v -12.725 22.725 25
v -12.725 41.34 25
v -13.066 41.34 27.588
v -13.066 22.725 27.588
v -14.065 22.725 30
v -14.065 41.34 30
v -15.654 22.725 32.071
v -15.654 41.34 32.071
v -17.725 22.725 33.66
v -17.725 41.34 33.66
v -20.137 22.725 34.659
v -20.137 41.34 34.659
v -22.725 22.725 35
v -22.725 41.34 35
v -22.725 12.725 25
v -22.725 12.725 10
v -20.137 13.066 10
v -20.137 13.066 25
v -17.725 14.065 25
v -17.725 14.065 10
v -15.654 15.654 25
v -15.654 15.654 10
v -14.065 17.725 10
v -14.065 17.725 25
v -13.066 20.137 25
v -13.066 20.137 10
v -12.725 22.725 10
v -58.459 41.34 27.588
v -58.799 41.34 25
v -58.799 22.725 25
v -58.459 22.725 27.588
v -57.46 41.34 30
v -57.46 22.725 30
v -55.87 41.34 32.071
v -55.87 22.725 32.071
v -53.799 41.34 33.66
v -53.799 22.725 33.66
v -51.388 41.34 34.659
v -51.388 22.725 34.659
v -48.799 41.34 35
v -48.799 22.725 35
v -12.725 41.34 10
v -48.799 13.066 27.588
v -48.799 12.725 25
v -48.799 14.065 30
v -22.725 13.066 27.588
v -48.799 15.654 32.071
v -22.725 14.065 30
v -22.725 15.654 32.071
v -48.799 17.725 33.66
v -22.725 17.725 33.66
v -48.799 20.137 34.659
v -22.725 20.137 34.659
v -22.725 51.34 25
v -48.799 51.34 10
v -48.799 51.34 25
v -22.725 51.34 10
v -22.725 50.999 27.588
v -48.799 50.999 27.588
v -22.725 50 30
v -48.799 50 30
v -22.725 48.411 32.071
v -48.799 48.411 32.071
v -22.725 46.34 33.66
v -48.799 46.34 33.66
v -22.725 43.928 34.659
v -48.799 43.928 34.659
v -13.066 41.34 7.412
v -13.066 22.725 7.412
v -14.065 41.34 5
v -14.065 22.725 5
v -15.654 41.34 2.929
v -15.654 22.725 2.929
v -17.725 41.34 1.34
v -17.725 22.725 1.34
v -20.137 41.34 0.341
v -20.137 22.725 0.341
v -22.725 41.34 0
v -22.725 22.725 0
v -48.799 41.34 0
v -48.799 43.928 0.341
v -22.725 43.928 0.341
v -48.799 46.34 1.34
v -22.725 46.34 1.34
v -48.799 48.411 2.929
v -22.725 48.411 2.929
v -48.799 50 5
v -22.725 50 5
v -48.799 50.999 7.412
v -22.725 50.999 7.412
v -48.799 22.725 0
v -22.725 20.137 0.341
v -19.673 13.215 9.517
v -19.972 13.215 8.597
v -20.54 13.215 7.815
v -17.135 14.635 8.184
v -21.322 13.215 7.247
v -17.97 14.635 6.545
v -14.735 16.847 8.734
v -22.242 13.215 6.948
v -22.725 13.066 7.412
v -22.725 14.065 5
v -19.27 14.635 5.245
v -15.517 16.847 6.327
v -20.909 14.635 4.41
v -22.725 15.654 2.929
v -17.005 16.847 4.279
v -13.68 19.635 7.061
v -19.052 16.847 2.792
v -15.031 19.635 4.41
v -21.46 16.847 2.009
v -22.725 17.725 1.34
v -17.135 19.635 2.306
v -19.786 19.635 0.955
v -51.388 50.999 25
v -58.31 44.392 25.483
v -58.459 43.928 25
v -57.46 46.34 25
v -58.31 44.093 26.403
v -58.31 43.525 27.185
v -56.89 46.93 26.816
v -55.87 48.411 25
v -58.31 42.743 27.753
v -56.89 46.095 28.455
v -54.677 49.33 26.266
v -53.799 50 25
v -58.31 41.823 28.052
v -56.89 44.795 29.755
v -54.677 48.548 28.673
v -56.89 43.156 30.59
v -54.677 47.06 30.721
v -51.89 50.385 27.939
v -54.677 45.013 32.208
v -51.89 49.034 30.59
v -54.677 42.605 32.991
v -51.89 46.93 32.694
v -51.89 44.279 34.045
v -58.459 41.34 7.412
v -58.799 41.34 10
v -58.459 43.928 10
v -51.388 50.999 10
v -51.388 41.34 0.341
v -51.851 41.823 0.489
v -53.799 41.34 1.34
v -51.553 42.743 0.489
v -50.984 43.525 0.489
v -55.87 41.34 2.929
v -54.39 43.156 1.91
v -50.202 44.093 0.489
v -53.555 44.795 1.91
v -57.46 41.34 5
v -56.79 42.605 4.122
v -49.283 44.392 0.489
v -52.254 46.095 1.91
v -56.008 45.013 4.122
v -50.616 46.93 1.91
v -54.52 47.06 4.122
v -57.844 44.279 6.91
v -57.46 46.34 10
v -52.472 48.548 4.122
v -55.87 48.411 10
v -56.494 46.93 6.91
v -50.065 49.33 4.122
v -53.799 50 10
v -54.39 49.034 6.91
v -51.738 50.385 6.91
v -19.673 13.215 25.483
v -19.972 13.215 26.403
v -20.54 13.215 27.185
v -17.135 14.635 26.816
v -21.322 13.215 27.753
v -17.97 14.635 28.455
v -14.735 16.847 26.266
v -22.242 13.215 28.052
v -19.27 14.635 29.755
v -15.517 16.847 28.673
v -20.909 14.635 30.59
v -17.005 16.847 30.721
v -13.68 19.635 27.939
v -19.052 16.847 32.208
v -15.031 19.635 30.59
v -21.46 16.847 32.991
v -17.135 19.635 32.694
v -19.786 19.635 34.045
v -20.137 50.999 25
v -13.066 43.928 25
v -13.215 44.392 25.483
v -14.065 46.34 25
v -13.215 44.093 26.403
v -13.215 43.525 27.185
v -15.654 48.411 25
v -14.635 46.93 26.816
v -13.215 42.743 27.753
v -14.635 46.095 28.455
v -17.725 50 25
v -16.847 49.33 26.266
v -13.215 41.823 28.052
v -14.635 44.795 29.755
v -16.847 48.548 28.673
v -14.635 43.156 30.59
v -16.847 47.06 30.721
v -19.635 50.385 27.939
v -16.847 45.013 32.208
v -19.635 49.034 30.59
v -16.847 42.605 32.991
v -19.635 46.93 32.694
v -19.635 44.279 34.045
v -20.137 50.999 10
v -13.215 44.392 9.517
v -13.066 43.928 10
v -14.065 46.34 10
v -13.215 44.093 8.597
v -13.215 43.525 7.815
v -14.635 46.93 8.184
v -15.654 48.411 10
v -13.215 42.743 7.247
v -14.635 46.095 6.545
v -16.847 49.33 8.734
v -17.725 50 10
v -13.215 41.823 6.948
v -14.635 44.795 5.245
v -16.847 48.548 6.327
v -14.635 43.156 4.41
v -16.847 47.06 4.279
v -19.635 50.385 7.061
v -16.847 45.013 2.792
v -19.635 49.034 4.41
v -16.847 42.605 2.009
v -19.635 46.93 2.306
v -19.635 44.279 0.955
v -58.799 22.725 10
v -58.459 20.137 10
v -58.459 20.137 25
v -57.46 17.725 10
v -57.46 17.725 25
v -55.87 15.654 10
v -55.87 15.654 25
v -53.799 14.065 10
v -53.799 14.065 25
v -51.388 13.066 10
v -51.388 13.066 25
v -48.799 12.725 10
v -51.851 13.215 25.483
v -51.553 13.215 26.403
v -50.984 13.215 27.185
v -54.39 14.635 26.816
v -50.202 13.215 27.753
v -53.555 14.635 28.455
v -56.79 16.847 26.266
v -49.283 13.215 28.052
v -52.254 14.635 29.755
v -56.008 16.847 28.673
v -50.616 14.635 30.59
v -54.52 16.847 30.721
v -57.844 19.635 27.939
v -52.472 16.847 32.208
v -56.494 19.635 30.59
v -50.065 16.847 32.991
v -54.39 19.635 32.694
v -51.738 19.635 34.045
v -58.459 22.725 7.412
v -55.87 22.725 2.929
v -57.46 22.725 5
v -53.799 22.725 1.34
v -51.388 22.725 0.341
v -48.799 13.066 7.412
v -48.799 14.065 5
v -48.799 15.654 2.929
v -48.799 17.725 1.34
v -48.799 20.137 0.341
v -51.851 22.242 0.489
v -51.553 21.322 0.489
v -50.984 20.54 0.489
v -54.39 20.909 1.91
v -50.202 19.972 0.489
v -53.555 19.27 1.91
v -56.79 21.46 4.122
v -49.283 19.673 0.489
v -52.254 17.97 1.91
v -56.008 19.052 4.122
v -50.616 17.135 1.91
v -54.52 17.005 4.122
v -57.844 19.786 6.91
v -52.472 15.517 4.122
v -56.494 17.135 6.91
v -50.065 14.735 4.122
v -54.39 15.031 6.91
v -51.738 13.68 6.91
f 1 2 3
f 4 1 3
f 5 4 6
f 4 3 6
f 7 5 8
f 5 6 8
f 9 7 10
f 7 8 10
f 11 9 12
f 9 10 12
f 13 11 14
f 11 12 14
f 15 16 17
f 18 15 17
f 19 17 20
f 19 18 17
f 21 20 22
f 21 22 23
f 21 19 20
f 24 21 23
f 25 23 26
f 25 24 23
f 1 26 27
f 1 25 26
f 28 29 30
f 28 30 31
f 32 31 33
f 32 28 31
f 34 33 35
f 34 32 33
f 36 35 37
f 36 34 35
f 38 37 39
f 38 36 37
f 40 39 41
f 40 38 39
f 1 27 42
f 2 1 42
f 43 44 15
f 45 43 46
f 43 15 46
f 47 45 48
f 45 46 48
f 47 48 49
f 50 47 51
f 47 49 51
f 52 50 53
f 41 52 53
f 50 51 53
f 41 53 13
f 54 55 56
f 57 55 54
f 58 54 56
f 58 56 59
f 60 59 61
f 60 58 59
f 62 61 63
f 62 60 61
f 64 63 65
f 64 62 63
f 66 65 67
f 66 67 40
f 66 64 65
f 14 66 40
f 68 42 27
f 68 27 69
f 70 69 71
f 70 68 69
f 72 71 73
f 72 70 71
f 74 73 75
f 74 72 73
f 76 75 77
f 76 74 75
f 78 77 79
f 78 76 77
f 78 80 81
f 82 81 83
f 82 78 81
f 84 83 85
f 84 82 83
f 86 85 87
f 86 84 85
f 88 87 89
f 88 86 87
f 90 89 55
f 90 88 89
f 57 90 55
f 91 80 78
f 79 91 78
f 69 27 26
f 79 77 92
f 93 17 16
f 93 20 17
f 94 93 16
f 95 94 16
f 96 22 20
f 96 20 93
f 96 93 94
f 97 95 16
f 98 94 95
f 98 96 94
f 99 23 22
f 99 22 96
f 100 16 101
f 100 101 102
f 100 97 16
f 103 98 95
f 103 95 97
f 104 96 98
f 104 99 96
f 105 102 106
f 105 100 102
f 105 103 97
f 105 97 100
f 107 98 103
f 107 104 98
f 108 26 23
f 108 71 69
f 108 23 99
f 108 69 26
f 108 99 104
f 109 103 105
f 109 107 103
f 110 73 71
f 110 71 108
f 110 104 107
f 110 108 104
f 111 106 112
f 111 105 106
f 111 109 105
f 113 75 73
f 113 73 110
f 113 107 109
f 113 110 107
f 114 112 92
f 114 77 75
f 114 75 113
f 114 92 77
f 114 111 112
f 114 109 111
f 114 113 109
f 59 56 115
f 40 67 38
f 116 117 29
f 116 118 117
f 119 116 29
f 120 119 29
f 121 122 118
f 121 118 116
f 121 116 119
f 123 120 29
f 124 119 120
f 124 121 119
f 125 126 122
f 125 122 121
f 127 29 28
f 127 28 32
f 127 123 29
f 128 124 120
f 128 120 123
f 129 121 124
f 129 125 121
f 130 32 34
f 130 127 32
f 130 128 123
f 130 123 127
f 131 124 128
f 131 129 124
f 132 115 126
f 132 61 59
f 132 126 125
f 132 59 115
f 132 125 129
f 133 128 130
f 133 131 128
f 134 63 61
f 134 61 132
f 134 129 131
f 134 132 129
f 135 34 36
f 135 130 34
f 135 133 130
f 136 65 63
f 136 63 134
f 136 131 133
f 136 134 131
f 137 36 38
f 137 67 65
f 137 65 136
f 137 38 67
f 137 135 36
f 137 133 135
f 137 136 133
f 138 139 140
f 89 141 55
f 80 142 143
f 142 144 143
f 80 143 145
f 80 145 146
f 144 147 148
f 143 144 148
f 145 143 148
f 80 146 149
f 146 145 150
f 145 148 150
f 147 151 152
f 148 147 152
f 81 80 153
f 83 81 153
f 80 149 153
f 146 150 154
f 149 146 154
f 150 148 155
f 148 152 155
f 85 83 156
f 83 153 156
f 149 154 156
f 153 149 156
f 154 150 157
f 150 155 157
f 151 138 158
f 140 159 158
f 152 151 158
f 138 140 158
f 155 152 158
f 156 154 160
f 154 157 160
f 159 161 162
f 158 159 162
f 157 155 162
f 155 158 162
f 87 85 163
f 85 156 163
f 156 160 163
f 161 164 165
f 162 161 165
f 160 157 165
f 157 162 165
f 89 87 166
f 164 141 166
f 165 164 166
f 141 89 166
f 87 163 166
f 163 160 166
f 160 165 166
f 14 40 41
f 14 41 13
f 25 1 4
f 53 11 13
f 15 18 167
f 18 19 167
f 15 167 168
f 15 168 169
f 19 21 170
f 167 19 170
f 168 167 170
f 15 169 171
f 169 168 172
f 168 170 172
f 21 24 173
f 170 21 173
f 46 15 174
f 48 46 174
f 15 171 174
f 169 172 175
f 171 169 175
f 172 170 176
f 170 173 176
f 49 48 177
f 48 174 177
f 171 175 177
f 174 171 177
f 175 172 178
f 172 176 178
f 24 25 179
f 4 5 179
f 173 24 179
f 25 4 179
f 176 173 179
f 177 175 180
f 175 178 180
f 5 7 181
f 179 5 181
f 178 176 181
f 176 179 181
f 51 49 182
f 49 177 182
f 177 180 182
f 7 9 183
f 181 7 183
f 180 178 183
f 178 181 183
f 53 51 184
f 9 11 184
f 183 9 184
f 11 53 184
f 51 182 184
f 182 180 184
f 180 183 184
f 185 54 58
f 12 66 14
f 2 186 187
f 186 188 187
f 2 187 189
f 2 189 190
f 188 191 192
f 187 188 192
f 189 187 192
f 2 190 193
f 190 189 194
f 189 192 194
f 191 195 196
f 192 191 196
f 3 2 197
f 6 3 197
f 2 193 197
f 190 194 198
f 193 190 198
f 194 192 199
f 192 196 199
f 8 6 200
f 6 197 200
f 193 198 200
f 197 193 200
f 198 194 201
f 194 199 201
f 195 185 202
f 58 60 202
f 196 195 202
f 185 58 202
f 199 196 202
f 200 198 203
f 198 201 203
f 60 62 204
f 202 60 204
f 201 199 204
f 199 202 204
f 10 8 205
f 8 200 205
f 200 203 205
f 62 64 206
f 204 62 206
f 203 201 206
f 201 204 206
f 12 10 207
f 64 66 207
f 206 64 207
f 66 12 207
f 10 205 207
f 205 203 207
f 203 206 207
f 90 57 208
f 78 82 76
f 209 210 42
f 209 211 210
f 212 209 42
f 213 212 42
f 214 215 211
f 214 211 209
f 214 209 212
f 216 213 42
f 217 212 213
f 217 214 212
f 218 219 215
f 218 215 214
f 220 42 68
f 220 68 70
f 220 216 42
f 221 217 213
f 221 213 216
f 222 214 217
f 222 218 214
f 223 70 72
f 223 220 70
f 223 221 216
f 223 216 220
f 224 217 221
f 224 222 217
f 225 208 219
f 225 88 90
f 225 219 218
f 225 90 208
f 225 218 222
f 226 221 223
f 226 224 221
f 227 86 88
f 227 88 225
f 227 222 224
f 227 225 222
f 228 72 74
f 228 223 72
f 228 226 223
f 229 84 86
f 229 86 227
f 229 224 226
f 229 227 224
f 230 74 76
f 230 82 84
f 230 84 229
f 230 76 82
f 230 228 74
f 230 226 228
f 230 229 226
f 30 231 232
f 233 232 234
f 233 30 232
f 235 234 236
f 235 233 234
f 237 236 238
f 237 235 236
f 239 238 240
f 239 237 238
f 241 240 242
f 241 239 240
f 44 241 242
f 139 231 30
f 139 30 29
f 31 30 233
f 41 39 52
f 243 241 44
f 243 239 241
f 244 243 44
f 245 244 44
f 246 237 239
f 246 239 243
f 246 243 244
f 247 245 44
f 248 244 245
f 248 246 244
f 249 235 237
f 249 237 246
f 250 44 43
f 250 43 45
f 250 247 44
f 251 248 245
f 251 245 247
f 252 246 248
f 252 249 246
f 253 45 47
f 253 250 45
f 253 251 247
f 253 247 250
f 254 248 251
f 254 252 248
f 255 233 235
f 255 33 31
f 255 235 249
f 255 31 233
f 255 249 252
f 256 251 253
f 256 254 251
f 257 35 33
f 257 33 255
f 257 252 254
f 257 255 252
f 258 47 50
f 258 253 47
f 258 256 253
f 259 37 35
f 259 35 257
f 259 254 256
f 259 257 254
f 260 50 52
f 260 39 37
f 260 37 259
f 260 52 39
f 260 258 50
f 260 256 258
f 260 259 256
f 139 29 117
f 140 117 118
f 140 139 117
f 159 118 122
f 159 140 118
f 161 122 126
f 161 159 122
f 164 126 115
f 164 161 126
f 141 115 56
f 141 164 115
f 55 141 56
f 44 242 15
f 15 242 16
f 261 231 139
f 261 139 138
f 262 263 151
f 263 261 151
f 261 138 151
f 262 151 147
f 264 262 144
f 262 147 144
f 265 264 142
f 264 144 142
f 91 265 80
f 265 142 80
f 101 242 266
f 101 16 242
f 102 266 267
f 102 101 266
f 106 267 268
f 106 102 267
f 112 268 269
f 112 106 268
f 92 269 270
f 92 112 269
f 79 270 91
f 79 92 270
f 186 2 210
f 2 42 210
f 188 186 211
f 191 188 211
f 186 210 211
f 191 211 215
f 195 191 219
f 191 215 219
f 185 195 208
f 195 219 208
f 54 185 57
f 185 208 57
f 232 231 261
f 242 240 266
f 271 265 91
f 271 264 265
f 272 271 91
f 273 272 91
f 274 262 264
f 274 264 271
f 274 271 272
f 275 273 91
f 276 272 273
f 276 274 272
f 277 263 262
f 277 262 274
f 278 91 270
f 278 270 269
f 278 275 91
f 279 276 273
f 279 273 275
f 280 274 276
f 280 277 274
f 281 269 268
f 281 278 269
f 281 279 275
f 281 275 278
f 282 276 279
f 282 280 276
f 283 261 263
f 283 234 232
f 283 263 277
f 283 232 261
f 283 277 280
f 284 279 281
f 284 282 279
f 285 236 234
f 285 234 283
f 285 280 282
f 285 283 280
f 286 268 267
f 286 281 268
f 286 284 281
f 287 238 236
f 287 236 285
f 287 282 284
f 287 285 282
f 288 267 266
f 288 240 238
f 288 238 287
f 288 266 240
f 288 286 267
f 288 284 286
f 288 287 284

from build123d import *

# Parameters (mm, degrees)
F0_W     = 46.0741333663
F0_H     = 38.6145105585
F1_DEPTH = 25
F2_DEPTH = 10
F3_R     = 10


with BuildPart() as f1:
    # F0 (on Top) → F1 (new body)
    with BuildSketch(Plane.XY):
        with Locations((-35.7623007149, 32.0324976929)):
            Rectangle(F0_W, F0_H)
    extrude(amount=F1_DEPTH)

    # F2 (add): a face of the model
    f2_faces = [f1.faces().sort_by_distance(p)[0] for p in [
        (-35.7623007149, 32.0324976929, 25),
    ]]
    extrude(f2_faces, amount=F2_DEPTH)

    # F3
    f3_edges = [f1.edges().sort_by_distance(p)[0] for p in [
        (-35.762301, 51.339753, 35),
        (-58.799367, 51.339753, 17.5),
        (-58.799367, 32.032498, 35),
        (-58.799367, 12.725242, 17.5),
        (-58.799367, 32.032498, 0),
        (-35.762301, 51.339753, 0),
        (-12.725234, 51.339753, 17.5),
        (-12.725234, 32.032498, 35),
        (-12.725234, 32.032498, 0),
        (-12.725234, 12.725242, 17.5),
        (-35.762301, 12.725242, 35),
        (-35.762301, 12.725242, 0),
    ]]
    fillet(f3_edges, radius=F3_R)


solid = f1.part
